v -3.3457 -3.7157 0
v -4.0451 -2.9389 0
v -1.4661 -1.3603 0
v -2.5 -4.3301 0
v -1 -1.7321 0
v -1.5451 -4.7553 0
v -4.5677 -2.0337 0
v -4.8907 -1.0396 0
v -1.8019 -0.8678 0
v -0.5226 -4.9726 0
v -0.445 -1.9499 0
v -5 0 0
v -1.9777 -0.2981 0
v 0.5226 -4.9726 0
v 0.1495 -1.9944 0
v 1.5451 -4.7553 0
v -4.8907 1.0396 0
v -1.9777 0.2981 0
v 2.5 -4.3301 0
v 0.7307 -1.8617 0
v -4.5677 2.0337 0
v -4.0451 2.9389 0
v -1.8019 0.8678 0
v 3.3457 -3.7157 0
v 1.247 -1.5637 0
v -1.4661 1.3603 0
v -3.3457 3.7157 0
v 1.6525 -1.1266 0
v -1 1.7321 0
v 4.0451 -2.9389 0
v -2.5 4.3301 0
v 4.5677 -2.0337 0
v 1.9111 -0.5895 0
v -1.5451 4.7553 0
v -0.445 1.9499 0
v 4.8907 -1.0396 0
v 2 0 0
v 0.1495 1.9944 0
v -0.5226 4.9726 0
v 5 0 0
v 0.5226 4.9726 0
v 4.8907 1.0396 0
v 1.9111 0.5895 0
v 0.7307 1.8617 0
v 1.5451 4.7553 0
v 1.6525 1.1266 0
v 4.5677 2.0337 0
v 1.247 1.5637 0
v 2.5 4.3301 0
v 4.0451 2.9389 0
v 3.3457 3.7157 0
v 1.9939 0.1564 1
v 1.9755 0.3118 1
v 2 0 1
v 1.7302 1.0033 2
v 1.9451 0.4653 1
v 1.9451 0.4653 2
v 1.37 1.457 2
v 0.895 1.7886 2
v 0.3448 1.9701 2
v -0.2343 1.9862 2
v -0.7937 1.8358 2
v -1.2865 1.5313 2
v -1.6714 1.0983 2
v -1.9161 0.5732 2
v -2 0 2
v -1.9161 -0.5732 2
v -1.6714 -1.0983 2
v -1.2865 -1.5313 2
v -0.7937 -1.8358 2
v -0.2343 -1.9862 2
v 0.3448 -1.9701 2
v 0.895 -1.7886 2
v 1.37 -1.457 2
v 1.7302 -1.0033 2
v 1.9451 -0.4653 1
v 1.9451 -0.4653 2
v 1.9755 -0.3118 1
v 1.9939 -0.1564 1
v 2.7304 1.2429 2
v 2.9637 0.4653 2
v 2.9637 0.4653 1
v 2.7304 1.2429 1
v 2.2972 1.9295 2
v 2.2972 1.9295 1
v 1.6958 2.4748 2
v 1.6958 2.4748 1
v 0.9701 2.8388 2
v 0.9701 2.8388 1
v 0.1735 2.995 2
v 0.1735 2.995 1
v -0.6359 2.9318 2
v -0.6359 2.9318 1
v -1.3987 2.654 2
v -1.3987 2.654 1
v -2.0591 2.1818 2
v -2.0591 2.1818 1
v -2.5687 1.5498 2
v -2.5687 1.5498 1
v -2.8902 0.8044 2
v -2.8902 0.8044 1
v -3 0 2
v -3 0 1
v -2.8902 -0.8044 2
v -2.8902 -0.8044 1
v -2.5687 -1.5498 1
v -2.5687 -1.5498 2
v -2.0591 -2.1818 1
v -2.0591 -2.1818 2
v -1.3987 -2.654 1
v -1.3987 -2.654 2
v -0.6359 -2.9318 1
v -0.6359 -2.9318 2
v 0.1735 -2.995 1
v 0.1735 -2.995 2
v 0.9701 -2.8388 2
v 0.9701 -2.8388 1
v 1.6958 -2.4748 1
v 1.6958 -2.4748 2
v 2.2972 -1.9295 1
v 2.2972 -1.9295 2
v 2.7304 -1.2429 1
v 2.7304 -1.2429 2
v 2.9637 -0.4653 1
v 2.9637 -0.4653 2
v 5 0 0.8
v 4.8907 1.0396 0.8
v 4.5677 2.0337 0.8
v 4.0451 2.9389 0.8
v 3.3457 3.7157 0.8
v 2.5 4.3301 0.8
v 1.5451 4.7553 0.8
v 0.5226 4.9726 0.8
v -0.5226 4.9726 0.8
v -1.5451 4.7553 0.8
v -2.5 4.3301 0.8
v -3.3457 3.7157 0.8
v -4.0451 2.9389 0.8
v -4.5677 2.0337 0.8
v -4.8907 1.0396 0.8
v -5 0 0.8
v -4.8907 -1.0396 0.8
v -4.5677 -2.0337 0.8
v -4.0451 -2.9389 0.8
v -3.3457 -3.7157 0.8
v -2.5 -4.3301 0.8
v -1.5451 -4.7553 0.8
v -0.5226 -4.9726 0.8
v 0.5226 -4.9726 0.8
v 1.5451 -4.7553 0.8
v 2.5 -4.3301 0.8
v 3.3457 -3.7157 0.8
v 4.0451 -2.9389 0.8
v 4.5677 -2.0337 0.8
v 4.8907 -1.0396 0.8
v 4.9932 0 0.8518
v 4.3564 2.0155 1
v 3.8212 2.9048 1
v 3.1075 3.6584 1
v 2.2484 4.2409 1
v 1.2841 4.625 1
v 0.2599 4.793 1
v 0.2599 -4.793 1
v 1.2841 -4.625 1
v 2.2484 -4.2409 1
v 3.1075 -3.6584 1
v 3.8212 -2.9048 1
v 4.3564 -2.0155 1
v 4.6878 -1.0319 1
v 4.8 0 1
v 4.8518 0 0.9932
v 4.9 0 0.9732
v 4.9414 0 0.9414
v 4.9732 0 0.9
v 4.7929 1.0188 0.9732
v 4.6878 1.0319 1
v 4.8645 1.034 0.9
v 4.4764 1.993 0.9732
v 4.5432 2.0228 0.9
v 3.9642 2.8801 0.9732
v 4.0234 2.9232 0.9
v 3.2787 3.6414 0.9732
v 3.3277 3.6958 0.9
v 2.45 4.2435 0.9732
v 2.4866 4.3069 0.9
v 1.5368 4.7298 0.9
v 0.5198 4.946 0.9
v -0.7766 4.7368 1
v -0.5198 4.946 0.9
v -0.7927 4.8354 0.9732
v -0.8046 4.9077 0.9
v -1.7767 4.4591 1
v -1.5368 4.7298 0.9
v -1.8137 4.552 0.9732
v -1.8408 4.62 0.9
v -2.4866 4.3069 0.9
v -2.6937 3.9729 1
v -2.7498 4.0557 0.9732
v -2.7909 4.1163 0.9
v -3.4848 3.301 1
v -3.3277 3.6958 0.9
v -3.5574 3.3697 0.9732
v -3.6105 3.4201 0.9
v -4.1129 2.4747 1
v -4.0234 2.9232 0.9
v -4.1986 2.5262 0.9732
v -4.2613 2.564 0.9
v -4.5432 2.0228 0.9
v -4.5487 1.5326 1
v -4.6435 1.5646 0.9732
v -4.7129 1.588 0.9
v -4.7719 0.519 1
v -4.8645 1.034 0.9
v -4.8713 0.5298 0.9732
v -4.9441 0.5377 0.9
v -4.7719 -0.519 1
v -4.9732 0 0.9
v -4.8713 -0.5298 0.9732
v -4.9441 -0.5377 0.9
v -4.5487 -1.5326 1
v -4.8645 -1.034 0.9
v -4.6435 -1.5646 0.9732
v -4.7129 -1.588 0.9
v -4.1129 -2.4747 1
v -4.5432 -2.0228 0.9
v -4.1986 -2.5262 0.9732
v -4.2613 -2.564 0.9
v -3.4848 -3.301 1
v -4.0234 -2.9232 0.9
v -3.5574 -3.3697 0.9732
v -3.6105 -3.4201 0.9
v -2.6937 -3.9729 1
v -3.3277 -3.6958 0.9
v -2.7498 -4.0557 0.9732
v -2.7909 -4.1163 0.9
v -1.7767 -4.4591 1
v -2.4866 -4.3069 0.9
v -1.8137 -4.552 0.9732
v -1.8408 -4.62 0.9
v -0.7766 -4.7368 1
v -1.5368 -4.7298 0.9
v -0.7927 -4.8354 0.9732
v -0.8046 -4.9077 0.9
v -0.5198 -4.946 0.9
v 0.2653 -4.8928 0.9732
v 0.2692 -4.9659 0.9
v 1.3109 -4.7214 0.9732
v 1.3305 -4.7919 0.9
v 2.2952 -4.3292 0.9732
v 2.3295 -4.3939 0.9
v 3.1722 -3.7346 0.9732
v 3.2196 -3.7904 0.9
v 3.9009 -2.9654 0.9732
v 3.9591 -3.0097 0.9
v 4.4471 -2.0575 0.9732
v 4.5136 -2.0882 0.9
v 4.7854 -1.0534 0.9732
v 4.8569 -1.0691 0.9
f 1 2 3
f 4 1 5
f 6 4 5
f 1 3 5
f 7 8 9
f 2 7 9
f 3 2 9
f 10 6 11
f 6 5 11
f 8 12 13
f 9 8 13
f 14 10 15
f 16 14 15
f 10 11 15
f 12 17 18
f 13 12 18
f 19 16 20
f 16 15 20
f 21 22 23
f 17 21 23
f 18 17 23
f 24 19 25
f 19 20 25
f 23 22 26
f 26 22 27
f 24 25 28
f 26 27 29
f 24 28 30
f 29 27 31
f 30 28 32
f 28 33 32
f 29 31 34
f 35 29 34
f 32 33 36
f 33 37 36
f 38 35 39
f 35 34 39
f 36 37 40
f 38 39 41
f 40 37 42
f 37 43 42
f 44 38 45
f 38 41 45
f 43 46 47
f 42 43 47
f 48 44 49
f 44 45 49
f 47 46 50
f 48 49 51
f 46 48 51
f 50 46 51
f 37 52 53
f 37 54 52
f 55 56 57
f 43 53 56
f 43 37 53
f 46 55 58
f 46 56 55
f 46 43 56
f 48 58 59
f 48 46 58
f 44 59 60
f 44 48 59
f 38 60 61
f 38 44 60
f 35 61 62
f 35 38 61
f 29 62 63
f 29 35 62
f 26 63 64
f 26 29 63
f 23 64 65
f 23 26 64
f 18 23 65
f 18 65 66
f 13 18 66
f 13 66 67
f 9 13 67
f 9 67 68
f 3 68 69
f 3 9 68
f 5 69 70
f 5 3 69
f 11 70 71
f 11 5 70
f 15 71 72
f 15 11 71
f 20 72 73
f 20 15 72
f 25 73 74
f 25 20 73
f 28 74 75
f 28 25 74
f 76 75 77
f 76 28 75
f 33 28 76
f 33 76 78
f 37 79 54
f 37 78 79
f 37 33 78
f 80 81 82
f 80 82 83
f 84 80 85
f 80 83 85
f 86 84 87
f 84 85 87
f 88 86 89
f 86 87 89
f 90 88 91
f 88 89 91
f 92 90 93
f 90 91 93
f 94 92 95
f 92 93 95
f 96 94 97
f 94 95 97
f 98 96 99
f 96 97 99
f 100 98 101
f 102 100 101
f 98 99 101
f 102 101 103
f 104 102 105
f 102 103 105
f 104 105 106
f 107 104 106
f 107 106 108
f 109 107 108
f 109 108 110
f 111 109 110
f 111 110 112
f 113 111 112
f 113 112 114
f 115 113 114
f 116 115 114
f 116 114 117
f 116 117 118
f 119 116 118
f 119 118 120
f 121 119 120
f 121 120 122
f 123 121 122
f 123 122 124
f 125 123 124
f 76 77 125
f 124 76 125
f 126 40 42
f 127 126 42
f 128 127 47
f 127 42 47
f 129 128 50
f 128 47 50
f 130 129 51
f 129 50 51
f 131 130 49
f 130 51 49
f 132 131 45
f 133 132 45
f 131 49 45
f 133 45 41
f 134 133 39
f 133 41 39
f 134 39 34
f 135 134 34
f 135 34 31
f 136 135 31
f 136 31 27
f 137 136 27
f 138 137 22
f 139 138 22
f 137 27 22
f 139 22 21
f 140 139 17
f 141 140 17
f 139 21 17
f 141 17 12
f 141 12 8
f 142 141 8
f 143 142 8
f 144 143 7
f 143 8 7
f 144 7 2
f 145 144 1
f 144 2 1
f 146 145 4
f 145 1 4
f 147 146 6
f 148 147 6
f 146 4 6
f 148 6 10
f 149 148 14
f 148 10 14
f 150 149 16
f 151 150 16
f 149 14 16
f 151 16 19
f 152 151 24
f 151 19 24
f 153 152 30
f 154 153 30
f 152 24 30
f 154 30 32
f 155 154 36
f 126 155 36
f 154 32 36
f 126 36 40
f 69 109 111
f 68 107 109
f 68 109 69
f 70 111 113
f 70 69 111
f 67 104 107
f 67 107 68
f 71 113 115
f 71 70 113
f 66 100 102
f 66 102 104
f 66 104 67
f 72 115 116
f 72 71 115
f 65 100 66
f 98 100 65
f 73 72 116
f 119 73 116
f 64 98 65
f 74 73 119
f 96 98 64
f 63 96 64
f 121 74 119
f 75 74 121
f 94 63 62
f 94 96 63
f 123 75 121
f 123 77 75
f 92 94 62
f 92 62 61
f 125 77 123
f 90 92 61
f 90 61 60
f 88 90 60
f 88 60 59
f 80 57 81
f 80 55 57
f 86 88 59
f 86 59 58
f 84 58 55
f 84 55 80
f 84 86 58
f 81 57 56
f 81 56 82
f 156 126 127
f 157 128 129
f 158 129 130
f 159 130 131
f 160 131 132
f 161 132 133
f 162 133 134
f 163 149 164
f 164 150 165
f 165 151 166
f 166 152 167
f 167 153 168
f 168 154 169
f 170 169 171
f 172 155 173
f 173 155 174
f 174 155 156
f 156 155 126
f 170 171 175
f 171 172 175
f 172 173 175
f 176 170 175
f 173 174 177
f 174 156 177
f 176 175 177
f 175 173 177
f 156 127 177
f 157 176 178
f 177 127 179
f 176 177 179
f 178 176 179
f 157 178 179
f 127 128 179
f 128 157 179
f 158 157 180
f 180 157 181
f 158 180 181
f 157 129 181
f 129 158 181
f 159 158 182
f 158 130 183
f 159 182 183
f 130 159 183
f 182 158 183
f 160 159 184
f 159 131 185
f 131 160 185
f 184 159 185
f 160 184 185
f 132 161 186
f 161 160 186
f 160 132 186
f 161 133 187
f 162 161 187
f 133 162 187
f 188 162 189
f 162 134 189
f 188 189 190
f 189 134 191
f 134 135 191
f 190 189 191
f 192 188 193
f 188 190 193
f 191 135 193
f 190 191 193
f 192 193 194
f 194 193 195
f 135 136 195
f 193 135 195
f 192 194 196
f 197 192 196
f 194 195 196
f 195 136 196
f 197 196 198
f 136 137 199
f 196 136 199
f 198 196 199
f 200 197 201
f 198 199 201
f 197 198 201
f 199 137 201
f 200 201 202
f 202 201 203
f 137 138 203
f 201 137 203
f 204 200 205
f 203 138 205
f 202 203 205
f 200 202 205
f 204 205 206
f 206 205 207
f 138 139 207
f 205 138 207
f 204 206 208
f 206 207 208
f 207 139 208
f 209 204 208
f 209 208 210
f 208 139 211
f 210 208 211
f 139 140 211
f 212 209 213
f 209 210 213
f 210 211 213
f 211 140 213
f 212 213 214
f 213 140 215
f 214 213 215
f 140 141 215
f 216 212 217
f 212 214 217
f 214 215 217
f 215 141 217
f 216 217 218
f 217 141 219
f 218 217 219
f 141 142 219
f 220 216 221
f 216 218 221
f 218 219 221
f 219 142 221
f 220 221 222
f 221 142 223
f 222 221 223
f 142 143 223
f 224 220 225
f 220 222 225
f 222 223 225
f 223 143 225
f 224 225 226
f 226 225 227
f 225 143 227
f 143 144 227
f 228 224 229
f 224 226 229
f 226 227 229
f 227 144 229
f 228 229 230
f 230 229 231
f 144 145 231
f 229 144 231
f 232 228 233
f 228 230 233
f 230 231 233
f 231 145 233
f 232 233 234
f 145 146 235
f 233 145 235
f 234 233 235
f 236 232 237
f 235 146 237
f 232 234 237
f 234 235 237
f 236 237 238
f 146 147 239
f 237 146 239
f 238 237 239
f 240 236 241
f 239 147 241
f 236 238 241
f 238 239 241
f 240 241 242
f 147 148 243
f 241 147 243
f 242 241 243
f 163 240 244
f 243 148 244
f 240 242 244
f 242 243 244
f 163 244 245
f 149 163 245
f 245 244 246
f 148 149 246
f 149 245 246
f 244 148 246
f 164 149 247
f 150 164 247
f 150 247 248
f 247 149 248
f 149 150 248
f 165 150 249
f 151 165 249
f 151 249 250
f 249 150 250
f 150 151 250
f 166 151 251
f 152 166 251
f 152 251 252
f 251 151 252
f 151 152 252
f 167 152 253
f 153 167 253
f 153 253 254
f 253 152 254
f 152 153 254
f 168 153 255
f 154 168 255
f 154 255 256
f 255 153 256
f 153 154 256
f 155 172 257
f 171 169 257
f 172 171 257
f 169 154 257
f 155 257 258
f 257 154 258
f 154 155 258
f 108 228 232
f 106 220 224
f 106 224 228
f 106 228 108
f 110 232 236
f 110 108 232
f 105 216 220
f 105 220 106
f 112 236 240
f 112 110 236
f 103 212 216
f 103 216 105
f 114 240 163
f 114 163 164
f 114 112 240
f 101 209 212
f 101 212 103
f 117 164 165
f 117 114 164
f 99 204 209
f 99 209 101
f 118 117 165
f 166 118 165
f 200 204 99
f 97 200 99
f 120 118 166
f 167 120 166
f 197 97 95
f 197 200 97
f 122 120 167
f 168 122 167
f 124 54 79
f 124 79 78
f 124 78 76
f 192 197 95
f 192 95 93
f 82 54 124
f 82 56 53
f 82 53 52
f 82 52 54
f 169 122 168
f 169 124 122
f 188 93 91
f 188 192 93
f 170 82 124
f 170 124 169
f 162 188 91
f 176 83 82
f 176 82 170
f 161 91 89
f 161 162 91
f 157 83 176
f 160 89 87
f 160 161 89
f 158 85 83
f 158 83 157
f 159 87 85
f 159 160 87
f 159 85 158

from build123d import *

# Parameters (mm, degrees)
F0_R     = 5
F0_R_2   = 2
F1_DEPTH = 1
F2_R     = 3
F2_R_2   = 2
F3_DEPTH = 1
F4_W     = 2.446195
F4_H     = 0.930616
F5_DEPTH = 1
F6_R     = 0.2


with BuildPart() as f1:
    # F0 (on Top) → F1 (new body)
    with BuildSketch(Plane.XY):
        Circle(F0_R)
        Circle(F0_R_2, mode=Mode.SUBTRACT)
    extrude(amount=F1_DEPTH)

    # F2 (on face) → F3 (join)
    with BuildSketch(Plane.XY.offset(1)):
        Circle(F2_R)
        Circle(F2_R_2, mode=Mode.SUBTRACT)
    extrude(amount=F3_DEPTH)

    # F4 (on face) → F5 (cut)
    with BuildSketch(Plane.XY.offset(2)):
        with Locations((2.446193, 0)):
            Rectangle(F4_W, F4_H)
    extrude(amount=-F5_DEPTH, mode=Mode.SUBTRACT)

    # F6
    f6_edges = [f1.edges().sort_by_distance(p)[0] for p in [
        (-5, 0, 1),
    ]]
    fillet(f6_edges, radius=F6_R)


solid = f1.part
